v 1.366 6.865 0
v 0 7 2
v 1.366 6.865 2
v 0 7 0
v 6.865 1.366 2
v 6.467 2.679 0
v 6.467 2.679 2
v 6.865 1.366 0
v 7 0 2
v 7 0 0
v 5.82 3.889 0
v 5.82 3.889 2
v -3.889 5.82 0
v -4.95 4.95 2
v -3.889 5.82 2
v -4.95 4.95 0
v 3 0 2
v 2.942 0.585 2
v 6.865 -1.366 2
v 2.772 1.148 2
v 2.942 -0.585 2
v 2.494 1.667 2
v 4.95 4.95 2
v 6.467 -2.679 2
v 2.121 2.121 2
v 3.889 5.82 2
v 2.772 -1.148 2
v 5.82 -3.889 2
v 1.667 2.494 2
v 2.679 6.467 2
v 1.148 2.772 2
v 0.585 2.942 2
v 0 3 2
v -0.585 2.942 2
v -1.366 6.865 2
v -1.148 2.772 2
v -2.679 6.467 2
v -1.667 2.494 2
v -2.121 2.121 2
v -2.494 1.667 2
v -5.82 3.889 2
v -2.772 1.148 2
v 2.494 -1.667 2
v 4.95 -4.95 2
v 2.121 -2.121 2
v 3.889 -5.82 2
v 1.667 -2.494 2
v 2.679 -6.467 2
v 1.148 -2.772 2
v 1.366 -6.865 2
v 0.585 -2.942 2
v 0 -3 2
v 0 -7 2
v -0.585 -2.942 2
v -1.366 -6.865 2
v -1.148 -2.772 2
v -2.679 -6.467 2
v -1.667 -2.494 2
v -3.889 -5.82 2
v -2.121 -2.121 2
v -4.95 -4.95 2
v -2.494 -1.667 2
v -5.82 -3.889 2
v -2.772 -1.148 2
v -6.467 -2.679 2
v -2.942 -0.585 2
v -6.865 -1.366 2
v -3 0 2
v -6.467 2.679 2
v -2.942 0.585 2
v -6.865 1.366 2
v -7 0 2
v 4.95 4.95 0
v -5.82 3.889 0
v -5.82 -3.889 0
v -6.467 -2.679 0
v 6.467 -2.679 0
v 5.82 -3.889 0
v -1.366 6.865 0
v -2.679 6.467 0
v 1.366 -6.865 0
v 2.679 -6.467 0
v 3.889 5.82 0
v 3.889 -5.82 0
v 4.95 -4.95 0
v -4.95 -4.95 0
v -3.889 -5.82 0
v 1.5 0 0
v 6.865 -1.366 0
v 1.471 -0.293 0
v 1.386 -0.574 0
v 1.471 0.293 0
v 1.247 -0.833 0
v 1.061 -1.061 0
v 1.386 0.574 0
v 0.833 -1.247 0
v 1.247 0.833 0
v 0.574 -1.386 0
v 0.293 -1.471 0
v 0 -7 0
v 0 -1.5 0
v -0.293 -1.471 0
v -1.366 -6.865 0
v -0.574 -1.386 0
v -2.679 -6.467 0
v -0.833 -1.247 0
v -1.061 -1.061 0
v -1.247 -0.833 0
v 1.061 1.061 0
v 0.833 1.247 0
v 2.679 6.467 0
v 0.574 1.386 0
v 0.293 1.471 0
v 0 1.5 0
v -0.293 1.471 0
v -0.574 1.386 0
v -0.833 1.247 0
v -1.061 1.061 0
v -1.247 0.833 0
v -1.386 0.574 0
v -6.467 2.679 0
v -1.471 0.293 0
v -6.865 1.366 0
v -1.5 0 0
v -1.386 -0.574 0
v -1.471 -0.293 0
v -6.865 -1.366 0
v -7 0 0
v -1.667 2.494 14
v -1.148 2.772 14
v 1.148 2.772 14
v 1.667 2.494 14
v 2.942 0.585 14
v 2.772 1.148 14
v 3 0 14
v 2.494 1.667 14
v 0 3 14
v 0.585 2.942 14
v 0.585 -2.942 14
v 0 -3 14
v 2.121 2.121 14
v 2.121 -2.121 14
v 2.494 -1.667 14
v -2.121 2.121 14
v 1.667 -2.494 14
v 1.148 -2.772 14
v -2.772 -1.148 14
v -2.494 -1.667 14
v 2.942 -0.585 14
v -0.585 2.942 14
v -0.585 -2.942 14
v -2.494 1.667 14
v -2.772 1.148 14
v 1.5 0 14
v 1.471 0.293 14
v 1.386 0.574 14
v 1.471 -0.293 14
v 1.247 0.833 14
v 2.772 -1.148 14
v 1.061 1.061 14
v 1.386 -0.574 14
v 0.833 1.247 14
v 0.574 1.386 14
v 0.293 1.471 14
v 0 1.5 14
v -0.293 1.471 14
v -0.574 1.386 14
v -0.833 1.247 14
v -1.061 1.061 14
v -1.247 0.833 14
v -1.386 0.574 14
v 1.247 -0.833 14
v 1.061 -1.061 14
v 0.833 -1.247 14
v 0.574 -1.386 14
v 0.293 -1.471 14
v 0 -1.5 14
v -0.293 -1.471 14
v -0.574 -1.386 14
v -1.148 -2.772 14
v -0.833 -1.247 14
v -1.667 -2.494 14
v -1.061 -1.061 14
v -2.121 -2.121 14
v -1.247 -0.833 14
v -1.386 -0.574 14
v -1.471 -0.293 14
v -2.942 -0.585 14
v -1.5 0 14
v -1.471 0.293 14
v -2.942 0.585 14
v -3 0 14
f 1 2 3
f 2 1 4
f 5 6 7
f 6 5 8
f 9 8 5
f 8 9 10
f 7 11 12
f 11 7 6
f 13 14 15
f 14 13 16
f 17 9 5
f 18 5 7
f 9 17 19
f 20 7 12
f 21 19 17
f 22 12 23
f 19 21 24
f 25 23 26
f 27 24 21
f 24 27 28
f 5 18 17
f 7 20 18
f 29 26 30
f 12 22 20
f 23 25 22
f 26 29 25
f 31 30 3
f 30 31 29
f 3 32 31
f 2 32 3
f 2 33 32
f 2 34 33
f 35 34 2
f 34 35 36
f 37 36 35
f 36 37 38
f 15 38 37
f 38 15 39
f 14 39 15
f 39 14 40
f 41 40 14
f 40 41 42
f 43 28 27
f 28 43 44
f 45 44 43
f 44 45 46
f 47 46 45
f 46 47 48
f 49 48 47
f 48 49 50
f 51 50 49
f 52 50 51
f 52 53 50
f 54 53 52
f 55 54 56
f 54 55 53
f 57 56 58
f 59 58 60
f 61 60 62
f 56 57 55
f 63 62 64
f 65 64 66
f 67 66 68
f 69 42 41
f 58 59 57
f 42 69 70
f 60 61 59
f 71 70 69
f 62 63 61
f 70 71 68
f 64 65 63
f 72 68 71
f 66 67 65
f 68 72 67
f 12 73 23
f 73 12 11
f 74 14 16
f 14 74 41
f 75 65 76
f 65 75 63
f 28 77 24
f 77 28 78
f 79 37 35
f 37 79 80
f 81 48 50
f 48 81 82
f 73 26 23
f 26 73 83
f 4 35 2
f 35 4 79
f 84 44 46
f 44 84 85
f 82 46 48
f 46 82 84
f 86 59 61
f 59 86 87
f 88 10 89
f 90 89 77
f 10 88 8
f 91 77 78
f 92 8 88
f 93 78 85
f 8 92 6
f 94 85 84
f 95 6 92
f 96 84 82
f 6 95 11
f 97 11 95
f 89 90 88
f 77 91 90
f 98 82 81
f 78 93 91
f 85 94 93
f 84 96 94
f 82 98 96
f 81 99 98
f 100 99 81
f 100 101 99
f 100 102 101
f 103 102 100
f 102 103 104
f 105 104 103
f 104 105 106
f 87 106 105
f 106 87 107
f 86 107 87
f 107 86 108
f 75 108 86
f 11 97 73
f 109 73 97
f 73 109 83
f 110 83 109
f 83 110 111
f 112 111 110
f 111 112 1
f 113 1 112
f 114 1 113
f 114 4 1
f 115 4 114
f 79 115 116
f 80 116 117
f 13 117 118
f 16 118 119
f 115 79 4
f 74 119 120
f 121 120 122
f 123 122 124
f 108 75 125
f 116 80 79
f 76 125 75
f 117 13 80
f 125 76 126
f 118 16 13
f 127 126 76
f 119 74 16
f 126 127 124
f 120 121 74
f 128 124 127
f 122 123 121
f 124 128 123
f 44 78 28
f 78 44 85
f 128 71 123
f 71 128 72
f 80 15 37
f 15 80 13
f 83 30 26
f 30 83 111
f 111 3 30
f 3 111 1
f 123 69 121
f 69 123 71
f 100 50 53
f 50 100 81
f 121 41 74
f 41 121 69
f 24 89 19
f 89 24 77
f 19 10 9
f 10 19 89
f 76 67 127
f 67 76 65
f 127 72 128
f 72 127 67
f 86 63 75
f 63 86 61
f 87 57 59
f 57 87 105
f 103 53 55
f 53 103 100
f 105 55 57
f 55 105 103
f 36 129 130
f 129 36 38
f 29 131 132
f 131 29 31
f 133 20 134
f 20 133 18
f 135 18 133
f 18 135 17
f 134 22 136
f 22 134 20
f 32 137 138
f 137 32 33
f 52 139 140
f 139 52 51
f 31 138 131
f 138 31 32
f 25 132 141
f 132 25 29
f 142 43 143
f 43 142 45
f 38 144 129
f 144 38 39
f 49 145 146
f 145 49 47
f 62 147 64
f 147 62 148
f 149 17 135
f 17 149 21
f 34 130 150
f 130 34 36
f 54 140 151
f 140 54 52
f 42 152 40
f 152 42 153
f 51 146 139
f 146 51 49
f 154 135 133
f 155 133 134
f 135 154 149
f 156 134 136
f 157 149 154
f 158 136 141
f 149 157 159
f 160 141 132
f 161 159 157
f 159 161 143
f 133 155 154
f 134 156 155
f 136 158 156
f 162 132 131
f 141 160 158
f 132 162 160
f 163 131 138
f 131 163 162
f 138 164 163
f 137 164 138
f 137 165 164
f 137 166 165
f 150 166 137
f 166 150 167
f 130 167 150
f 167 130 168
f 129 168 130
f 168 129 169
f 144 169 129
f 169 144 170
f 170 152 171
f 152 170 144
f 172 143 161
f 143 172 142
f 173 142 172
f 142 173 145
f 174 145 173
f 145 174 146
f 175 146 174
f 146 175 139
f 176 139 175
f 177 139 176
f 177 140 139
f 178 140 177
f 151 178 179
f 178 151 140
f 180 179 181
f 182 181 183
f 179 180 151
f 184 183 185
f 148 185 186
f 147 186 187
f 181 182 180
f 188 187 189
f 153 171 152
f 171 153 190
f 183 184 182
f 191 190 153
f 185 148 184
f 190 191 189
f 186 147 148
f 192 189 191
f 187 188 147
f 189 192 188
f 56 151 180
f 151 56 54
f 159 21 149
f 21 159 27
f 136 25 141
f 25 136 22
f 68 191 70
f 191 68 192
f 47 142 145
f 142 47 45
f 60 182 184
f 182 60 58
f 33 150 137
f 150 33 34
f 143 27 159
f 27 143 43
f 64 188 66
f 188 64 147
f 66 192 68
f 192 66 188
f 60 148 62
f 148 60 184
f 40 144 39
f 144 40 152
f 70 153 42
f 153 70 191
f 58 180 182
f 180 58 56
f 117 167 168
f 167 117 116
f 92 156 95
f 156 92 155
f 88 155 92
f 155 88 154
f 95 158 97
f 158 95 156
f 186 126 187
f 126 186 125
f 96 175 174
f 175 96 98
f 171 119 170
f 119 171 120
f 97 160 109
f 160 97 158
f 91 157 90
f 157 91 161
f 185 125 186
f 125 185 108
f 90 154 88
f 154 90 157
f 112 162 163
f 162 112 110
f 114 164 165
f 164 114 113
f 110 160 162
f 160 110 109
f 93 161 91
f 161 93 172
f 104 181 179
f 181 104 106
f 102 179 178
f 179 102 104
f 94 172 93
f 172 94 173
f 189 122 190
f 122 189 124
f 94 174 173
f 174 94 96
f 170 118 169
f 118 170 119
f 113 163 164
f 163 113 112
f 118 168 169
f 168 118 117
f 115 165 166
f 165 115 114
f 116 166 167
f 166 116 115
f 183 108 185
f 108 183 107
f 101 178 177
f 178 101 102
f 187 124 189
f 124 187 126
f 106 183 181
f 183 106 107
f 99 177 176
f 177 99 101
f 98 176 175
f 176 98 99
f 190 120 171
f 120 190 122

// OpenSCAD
$fn = 32;

// ----------------------------------------------------------------------
// Micro post: flanged post, 5-20 mm class
// ----------------------------------------------------------------------

// --- parameters (mm) ---
post_d = 6;               // post diameter
post_h = 12;              // post height above the flange
flange_d = 14;            // flange diameter
flange_t = 2;             // flange thickness
bore_d = 3;               // through bore

total_h = post_h + flange_t;  // overall height

difference() {
  union() {
    cylinder(h = flange_t, d = flange_d);
    translate([0, 0, flange_t]) cylinder(h = post_h, d = post_d);
  }
  translate([0, 0, -1]) cylinder(h = total_h + 2, d = bore_d);
}
